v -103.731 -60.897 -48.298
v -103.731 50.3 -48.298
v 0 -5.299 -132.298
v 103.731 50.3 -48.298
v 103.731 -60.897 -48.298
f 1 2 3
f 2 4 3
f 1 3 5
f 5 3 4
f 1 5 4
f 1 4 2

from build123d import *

# Parameters (mm, degrees)
BOSS_EXTRUDE1_DEPTH = 90.101349
CUT_EXTRUDE3_DEPTH  = 257.717103907
CUT_EXTRUDE4_DEPTH  = 202.563222837


with BuildPart() as part:
    # 3DSketch1 → Boss-Extrude1 (new body)
    with BuildSketch(Plane(origin=(-103.731361149, 50.299698024, -48.298204463), x_dir=(0.8813808665660824, -0.4724063590291962, 0), z_dir=(0, 0, 1))):
        Polygon((0, 0), (182.853673959, 98.006709275), (235.383737233, 0), (52.530063274, -98.006709275), align=None)
    extrude(amount=-BOSS_EXTRUDE1_DEPTH)

    # Sketch3 → Cut-Extrude3 (cut, through all)
    with BuildSketch(Plane.ZY.offset(103.731361149)):
        Polygon((-48.298204463, 50.299698024), (-132.298204463, -5.298689116), (-48.298204463, -60.897076257), (-138.399553935, -60.897076257), (-138.399553935, 50.299698024), align=None)
    extrude(amount=-CUT_EXTRUDE3_DEPTH, mode=Mode.SUBTRACT)

    # Sketch2 → Cut-Extrude4 (cut, through all)
    with BuildSketch(Plane(origin=(0, 50.299698024, 0), x_dir=(1, 0, 0), z_dir=(0, 1, 0))):
        Polygon((-103.731361149, 48.298204463), (0, 132.298204463), (103.731361149, 48.298204463), (103.731361149, 138.399553935), (-103.731361149, 138.399553935), align=None)
    extrude(amount=-CUT_EXTRUDE4_DEPTH, mode=Mode.SUBTRACT)


solid = part.part
